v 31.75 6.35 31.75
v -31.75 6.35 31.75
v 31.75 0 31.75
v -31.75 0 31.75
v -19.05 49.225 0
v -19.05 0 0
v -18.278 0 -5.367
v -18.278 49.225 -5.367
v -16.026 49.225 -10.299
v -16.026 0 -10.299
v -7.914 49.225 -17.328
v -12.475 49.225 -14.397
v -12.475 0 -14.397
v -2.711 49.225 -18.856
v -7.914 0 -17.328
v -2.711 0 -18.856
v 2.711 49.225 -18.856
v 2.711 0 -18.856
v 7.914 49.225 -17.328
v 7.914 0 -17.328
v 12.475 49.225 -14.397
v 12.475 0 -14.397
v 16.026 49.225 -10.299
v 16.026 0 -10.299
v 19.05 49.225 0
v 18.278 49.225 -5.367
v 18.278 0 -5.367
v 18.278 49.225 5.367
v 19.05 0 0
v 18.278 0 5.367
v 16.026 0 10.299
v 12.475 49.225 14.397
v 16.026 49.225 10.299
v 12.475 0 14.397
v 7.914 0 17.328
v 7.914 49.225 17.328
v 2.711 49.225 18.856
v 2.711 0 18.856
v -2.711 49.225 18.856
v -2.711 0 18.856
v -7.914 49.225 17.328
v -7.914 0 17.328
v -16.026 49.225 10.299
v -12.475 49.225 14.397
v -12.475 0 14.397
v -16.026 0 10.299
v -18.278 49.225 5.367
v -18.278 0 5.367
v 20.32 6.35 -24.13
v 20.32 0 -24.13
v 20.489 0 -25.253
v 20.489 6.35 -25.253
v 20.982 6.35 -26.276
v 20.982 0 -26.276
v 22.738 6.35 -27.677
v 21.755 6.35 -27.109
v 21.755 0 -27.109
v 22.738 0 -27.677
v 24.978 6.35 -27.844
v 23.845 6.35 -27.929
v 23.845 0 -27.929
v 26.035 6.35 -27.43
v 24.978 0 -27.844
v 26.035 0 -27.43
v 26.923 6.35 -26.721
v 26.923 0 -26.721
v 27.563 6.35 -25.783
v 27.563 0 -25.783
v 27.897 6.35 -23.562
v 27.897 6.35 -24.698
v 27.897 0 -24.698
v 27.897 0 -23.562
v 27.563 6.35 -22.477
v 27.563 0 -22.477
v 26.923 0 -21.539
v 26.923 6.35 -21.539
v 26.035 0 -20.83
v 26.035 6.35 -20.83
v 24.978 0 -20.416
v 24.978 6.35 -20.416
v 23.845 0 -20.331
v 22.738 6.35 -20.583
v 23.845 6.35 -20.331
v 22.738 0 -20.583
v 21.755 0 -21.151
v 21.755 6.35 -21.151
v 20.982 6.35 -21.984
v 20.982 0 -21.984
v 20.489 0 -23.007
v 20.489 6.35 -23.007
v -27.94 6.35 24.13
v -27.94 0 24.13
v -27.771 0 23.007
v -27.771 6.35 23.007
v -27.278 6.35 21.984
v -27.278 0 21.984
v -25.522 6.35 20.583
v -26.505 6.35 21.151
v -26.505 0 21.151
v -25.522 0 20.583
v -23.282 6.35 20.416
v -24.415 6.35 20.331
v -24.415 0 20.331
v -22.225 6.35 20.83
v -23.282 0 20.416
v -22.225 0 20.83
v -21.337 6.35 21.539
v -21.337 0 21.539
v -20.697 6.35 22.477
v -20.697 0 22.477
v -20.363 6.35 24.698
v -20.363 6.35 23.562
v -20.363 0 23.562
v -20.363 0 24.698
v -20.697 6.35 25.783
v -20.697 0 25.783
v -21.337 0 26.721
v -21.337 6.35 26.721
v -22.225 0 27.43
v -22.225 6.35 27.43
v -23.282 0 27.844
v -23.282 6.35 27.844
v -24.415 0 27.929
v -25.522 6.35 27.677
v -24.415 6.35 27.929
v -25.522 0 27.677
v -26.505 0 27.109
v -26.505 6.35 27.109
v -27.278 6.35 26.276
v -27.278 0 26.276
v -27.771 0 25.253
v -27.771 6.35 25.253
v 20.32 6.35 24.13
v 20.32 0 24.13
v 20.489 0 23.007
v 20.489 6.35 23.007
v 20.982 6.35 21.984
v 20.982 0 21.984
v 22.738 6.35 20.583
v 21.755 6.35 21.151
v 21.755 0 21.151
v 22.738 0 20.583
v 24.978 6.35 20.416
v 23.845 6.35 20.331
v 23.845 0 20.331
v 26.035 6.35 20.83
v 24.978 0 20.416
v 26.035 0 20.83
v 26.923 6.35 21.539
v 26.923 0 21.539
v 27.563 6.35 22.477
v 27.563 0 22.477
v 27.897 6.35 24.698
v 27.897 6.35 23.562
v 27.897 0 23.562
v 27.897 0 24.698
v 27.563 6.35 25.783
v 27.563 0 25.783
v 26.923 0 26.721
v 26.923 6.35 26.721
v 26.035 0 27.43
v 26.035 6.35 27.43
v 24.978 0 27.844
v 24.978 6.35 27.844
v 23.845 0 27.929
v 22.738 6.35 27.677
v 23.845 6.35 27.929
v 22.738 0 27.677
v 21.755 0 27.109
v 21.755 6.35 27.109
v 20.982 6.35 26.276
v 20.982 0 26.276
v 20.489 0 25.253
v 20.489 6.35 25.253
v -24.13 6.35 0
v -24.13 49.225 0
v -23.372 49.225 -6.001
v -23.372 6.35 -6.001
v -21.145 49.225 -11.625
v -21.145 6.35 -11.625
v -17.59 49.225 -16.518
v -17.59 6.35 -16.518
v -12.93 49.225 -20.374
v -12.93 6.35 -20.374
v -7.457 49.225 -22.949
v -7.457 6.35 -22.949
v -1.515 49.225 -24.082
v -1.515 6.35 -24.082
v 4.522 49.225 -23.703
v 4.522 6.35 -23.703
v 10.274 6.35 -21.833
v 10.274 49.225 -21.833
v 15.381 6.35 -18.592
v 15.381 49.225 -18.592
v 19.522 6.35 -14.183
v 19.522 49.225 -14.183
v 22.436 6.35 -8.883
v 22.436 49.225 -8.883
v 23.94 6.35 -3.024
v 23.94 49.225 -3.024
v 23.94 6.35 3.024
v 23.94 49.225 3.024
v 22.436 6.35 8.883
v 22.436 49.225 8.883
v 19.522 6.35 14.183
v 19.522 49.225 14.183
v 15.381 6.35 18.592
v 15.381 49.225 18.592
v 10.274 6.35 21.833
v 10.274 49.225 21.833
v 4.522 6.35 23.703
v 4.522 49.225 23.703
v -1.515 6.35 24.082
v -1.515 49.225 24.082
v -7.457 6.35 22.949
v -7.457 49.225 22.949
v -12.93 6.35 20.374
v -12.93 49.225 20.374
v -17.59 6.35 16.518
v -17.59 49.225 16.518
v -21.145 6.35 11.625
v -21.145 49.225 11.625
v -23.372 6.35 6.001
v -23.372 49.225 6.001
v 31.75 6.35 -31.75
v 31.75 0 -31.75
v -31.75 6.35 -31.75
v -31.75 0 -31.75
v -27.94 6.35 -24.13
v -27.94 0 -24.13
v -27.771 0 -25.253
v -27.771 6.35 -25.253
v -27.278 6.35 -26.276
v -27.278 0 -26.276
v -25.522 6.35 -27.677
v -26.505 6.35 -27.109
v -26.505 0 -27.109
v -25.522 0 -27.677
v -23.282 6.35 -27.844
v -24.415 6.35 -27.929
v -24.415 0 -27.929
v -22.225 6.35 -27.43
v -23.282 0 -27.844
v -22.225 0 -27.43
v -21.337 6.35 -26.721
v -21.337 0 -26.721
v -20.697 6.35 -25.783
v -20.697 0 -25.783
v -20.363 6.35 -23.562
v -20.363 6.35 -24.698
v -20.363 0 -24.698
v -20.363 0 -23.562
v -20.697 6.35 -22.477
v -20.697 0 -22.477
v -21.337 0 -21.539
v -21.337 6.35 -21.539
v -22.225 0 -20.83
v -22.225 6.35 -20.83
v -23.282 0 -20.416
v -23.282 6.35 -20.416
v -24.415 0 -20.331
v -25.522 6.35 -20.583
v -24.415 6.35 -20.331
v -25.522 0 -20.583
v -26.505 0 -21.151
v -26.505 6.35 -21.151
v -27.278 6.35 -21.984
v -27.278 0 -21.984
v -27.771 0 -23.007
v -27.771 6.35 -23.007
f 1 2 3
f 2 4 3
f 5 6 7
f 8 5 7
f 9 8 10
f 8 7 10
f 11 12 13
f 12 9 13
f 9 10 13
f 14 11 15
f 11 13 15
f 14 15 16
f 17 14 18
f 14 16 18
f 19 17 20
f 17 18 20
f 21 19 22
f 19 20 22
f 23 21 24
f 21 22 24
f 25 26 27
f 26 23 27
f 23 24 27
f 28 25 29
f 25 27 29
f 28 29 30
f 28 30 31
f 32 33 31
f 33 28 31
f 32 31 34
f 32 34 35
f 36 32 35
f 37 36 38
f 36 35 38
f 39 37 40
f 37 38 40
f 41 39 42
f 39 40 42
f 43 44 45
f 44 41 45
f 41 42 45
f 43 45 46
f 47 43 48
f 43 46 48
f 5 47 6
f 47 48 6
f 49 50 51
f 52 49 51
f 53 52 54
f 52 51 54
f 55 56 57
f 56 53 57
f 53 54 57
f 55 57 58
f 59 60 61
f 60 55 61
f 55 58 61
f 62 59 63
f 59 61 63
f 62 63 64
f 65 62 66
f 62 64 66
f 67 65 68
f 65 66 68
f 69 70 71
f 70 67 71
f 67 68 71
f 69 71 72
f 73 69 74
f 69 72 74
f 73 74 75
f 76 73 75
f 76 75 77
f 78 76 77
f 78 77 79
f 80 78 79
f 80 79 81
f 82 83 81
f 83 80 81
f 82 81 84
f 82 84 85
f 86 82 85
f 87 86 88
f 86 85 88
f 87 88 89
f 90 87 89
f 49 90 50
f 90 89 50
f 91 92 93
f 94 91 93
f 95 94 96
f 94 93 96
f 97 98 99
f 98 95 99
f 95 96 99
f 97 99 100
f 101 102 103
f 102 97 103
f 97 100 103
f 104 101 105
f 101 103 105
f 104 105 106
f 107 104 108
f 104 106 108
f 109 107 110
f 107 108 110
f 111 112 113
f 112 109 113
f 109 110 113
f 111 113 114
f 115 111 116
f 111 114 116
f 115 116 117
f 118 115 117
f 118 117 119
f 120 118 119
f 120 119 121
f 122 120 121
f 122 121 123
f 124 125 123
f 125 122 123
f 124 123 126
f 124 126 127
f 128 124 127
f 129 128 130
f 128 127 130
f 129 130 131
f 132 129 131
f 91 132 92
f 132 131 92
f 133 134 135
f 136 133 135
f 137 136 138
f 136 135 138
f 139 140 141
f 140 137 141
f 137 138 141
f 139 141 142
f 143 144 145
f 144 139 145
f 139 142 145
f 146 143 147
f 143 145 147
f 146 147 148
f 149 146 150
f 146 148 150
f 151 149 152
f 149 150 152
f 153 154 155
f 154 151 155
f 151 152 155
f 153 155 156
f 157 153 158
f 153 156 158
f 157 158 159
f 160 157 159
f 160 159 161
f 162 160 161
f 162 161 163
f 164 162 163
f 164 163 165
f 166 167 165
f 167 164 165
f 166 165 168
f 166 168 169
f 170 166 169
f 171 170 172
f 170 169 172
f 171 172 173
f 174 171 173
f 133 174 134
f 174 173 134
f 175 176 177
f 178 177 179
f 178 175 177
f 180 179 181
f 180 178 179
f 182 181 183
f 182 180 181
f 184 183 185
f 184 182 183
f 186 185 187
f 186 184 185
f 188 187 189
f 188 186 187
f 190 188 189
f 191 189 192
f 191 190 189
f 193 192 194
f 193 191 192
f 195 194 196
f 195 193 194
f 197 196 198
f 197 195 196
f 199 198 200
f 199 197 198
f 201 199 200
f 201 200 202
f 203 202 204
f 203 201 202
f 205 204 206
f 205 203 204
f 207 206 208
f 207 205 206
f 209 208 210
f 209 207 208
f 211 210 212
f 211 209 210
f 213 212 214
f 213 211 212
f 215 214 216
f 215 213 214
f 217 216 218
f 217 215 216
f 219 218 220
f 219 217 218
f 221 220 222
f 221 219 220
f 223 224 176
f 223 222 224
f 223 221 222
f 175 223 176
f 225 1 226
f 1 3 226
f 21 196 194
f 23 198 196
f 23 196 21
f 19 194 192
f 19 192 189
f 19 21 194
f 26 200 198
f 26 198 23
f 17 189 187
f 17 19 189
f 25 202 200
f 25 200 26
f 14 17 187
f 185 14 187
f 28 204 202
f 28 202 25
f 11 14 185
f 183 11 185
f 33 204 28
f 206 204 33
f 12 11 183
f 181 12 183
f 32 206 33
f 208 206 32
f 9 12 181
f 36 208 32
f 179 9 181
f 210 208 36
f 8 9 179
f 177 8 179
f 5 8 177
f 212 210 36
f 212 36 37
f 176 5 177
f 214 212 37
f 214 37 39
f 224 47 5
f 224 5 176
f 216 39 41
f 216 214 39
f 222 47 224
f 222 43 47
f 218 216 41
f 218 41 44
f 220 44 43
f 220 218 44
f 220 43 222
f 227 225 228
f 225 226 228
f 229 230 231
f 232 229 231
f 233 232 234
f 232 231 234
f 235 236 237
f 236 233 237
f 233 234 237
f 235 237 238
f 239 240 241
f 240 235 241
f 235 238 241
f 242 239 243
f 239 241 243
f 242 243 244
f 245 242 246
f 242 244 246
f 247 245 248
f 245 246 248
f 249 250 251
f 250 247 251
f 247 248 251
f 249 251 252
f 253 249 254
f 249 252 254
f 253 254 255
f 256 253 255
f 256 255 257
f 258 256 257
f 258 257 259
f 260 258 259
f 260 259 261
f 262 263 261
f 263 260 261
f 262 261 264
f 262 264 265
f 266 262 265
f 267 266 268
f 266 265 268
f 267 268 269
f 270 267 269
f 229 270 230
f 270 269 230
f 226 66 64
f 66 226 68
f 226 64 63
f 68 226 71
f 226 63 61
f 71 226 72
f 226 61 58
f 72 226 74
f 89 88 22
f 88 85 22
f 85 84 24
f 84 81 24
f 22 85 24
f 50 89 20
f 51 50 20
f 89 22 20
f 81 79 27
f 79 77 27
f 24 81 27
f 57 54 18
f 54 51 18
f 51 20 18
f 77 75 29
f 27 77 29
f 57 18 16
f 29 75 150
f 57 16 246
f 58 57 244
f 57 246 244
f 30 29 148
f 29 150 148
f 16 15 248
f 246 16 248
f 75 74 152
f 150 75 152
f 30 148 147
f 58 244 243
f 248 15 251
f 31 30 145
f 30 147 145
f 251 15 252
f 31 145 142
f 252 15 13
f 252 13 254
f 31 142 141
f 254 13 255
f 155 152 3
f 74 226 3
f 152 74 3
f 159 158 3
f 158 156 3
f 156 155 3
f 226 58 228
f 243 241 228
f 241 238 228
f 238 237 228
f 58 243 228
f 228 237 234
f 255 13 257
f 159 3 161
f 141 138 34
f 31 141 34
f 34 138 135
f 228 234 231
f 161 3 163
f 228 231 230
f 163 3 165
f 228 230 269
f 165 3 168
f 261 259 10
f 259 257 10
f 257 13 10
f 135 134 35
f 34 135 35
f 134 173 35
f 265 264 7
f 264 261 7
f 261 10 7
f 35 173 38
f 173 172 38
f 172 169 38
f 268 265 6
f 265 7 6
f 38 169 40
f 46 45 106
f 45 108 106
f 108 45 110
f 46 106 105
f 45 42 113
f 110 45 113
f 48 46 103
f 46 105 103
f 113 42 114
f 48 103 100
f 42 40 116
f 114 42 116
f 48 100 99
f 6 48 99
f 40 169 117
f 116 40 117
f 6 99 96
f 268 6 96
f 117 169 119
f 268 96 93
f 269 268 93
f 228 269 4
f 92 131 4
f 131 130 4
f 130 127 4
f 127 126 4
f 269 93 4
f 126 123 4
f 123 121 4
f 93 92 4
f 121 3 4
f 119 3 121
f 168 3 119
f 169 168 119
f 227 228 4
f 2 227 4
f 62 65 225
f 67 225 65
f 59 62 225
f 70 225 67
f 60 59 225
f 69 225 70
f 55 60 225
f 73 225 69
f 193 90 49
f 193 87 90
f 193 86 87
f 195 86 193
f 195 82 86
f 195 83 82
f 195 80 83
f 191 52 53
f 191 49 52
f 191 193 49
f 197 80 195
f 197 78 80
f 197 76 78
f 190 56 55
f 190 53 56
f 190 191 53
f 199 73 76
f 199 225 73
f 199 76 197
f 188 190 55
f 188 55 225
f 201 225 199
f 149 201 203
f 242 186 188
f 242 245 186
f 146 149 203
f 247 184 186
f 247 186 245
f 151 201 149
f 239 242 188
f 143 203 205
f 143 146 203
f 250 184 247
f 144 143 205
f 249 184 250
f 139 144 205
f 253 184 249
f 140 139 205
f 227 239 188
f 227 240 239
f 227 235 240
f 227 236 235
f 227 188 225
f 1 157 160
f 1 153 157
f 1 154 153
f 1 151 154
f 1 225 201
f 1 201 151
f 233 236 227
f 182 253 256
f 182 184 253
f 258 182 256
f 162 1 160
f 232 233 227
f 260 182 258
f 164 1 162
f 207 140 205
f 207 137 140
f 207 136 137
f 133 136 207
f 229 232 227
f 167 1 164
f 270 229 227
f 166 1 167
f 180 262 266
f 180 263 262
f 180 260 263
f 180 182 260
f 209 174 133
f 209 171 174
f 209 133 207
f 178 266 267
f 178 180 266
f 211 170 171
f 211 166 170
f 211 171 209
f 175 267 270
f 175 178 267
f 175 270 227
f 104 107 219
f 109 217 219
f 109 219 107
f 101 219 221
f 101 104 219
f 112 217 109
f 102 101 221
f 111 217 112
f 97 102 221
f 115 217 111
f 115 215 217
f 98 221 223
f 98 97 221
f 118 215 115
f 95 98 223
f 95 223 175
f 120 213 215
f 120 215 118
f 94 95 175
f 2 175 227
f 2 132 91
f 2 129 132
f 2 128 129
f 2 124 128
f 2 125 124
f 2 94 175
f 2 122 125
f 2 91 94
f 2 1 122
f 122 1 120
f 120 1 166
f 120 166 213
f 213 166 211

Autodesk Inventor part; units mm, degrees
ref_plane "YZ Plane" through (0, 0, 0) normal (1, 0, 0) x (0, 1, 0)
ref_plane "XZ Plane" through (0, 0, 0) normal (0, 1, 0) x (-1, 0, 0)
ref_plane "XY Plane" through (0, 0, 0) normal (0, 0, 1) x (1, 0, 0)
sketch "Sketch1" plane through (0, 0, 0) normal (0, 1, 0) x (-1, 0, 0)
  circle A0 centre (0, 0) radius 19.05
  circle A1 centre (0, 0) radius 24.13
  line L0 (31.75, 31.75) -> (-31.75, 31.75)
  line L1 (-31.75, 31.75) -> (-31.75, -31.75)
  line L2 (-31.75, -31.75) -> (31.75, -31.75)
  line L3 (31.75, -31.75) -> (31.75, 31.75)
  line L4 (31.75, 31.75) -> (24.13, 31.75)
  circle A2 centre (24.13, 24.13) radius 3.81
  circle A3 centre (-24.13, 24.13) radius 3.81
  circle A4 centre (24.13, -24.13) radius 3.81
  circle A5 centre (-24.13, -24.13) radius 3.81
  dimension "d10" = 63.5
  dimension "d11" = 63.5
  dimension "d14" = 7.62
extrude "Extrusion1" add sketch "Sketch1" along normal blind 49.2252 contours A1
extrude "Extrusion3" add sketch "Sketch1" along normal blind 6.35 contours A1 | L3 L2 L1 L0 | A2 | A3 | A4 | A5
extrude "Extrusion4" cut sketch "Sketch1" along normal blind 6.35 contours A2 | A3 | A4 | A5
properties part number "Cylinders"
